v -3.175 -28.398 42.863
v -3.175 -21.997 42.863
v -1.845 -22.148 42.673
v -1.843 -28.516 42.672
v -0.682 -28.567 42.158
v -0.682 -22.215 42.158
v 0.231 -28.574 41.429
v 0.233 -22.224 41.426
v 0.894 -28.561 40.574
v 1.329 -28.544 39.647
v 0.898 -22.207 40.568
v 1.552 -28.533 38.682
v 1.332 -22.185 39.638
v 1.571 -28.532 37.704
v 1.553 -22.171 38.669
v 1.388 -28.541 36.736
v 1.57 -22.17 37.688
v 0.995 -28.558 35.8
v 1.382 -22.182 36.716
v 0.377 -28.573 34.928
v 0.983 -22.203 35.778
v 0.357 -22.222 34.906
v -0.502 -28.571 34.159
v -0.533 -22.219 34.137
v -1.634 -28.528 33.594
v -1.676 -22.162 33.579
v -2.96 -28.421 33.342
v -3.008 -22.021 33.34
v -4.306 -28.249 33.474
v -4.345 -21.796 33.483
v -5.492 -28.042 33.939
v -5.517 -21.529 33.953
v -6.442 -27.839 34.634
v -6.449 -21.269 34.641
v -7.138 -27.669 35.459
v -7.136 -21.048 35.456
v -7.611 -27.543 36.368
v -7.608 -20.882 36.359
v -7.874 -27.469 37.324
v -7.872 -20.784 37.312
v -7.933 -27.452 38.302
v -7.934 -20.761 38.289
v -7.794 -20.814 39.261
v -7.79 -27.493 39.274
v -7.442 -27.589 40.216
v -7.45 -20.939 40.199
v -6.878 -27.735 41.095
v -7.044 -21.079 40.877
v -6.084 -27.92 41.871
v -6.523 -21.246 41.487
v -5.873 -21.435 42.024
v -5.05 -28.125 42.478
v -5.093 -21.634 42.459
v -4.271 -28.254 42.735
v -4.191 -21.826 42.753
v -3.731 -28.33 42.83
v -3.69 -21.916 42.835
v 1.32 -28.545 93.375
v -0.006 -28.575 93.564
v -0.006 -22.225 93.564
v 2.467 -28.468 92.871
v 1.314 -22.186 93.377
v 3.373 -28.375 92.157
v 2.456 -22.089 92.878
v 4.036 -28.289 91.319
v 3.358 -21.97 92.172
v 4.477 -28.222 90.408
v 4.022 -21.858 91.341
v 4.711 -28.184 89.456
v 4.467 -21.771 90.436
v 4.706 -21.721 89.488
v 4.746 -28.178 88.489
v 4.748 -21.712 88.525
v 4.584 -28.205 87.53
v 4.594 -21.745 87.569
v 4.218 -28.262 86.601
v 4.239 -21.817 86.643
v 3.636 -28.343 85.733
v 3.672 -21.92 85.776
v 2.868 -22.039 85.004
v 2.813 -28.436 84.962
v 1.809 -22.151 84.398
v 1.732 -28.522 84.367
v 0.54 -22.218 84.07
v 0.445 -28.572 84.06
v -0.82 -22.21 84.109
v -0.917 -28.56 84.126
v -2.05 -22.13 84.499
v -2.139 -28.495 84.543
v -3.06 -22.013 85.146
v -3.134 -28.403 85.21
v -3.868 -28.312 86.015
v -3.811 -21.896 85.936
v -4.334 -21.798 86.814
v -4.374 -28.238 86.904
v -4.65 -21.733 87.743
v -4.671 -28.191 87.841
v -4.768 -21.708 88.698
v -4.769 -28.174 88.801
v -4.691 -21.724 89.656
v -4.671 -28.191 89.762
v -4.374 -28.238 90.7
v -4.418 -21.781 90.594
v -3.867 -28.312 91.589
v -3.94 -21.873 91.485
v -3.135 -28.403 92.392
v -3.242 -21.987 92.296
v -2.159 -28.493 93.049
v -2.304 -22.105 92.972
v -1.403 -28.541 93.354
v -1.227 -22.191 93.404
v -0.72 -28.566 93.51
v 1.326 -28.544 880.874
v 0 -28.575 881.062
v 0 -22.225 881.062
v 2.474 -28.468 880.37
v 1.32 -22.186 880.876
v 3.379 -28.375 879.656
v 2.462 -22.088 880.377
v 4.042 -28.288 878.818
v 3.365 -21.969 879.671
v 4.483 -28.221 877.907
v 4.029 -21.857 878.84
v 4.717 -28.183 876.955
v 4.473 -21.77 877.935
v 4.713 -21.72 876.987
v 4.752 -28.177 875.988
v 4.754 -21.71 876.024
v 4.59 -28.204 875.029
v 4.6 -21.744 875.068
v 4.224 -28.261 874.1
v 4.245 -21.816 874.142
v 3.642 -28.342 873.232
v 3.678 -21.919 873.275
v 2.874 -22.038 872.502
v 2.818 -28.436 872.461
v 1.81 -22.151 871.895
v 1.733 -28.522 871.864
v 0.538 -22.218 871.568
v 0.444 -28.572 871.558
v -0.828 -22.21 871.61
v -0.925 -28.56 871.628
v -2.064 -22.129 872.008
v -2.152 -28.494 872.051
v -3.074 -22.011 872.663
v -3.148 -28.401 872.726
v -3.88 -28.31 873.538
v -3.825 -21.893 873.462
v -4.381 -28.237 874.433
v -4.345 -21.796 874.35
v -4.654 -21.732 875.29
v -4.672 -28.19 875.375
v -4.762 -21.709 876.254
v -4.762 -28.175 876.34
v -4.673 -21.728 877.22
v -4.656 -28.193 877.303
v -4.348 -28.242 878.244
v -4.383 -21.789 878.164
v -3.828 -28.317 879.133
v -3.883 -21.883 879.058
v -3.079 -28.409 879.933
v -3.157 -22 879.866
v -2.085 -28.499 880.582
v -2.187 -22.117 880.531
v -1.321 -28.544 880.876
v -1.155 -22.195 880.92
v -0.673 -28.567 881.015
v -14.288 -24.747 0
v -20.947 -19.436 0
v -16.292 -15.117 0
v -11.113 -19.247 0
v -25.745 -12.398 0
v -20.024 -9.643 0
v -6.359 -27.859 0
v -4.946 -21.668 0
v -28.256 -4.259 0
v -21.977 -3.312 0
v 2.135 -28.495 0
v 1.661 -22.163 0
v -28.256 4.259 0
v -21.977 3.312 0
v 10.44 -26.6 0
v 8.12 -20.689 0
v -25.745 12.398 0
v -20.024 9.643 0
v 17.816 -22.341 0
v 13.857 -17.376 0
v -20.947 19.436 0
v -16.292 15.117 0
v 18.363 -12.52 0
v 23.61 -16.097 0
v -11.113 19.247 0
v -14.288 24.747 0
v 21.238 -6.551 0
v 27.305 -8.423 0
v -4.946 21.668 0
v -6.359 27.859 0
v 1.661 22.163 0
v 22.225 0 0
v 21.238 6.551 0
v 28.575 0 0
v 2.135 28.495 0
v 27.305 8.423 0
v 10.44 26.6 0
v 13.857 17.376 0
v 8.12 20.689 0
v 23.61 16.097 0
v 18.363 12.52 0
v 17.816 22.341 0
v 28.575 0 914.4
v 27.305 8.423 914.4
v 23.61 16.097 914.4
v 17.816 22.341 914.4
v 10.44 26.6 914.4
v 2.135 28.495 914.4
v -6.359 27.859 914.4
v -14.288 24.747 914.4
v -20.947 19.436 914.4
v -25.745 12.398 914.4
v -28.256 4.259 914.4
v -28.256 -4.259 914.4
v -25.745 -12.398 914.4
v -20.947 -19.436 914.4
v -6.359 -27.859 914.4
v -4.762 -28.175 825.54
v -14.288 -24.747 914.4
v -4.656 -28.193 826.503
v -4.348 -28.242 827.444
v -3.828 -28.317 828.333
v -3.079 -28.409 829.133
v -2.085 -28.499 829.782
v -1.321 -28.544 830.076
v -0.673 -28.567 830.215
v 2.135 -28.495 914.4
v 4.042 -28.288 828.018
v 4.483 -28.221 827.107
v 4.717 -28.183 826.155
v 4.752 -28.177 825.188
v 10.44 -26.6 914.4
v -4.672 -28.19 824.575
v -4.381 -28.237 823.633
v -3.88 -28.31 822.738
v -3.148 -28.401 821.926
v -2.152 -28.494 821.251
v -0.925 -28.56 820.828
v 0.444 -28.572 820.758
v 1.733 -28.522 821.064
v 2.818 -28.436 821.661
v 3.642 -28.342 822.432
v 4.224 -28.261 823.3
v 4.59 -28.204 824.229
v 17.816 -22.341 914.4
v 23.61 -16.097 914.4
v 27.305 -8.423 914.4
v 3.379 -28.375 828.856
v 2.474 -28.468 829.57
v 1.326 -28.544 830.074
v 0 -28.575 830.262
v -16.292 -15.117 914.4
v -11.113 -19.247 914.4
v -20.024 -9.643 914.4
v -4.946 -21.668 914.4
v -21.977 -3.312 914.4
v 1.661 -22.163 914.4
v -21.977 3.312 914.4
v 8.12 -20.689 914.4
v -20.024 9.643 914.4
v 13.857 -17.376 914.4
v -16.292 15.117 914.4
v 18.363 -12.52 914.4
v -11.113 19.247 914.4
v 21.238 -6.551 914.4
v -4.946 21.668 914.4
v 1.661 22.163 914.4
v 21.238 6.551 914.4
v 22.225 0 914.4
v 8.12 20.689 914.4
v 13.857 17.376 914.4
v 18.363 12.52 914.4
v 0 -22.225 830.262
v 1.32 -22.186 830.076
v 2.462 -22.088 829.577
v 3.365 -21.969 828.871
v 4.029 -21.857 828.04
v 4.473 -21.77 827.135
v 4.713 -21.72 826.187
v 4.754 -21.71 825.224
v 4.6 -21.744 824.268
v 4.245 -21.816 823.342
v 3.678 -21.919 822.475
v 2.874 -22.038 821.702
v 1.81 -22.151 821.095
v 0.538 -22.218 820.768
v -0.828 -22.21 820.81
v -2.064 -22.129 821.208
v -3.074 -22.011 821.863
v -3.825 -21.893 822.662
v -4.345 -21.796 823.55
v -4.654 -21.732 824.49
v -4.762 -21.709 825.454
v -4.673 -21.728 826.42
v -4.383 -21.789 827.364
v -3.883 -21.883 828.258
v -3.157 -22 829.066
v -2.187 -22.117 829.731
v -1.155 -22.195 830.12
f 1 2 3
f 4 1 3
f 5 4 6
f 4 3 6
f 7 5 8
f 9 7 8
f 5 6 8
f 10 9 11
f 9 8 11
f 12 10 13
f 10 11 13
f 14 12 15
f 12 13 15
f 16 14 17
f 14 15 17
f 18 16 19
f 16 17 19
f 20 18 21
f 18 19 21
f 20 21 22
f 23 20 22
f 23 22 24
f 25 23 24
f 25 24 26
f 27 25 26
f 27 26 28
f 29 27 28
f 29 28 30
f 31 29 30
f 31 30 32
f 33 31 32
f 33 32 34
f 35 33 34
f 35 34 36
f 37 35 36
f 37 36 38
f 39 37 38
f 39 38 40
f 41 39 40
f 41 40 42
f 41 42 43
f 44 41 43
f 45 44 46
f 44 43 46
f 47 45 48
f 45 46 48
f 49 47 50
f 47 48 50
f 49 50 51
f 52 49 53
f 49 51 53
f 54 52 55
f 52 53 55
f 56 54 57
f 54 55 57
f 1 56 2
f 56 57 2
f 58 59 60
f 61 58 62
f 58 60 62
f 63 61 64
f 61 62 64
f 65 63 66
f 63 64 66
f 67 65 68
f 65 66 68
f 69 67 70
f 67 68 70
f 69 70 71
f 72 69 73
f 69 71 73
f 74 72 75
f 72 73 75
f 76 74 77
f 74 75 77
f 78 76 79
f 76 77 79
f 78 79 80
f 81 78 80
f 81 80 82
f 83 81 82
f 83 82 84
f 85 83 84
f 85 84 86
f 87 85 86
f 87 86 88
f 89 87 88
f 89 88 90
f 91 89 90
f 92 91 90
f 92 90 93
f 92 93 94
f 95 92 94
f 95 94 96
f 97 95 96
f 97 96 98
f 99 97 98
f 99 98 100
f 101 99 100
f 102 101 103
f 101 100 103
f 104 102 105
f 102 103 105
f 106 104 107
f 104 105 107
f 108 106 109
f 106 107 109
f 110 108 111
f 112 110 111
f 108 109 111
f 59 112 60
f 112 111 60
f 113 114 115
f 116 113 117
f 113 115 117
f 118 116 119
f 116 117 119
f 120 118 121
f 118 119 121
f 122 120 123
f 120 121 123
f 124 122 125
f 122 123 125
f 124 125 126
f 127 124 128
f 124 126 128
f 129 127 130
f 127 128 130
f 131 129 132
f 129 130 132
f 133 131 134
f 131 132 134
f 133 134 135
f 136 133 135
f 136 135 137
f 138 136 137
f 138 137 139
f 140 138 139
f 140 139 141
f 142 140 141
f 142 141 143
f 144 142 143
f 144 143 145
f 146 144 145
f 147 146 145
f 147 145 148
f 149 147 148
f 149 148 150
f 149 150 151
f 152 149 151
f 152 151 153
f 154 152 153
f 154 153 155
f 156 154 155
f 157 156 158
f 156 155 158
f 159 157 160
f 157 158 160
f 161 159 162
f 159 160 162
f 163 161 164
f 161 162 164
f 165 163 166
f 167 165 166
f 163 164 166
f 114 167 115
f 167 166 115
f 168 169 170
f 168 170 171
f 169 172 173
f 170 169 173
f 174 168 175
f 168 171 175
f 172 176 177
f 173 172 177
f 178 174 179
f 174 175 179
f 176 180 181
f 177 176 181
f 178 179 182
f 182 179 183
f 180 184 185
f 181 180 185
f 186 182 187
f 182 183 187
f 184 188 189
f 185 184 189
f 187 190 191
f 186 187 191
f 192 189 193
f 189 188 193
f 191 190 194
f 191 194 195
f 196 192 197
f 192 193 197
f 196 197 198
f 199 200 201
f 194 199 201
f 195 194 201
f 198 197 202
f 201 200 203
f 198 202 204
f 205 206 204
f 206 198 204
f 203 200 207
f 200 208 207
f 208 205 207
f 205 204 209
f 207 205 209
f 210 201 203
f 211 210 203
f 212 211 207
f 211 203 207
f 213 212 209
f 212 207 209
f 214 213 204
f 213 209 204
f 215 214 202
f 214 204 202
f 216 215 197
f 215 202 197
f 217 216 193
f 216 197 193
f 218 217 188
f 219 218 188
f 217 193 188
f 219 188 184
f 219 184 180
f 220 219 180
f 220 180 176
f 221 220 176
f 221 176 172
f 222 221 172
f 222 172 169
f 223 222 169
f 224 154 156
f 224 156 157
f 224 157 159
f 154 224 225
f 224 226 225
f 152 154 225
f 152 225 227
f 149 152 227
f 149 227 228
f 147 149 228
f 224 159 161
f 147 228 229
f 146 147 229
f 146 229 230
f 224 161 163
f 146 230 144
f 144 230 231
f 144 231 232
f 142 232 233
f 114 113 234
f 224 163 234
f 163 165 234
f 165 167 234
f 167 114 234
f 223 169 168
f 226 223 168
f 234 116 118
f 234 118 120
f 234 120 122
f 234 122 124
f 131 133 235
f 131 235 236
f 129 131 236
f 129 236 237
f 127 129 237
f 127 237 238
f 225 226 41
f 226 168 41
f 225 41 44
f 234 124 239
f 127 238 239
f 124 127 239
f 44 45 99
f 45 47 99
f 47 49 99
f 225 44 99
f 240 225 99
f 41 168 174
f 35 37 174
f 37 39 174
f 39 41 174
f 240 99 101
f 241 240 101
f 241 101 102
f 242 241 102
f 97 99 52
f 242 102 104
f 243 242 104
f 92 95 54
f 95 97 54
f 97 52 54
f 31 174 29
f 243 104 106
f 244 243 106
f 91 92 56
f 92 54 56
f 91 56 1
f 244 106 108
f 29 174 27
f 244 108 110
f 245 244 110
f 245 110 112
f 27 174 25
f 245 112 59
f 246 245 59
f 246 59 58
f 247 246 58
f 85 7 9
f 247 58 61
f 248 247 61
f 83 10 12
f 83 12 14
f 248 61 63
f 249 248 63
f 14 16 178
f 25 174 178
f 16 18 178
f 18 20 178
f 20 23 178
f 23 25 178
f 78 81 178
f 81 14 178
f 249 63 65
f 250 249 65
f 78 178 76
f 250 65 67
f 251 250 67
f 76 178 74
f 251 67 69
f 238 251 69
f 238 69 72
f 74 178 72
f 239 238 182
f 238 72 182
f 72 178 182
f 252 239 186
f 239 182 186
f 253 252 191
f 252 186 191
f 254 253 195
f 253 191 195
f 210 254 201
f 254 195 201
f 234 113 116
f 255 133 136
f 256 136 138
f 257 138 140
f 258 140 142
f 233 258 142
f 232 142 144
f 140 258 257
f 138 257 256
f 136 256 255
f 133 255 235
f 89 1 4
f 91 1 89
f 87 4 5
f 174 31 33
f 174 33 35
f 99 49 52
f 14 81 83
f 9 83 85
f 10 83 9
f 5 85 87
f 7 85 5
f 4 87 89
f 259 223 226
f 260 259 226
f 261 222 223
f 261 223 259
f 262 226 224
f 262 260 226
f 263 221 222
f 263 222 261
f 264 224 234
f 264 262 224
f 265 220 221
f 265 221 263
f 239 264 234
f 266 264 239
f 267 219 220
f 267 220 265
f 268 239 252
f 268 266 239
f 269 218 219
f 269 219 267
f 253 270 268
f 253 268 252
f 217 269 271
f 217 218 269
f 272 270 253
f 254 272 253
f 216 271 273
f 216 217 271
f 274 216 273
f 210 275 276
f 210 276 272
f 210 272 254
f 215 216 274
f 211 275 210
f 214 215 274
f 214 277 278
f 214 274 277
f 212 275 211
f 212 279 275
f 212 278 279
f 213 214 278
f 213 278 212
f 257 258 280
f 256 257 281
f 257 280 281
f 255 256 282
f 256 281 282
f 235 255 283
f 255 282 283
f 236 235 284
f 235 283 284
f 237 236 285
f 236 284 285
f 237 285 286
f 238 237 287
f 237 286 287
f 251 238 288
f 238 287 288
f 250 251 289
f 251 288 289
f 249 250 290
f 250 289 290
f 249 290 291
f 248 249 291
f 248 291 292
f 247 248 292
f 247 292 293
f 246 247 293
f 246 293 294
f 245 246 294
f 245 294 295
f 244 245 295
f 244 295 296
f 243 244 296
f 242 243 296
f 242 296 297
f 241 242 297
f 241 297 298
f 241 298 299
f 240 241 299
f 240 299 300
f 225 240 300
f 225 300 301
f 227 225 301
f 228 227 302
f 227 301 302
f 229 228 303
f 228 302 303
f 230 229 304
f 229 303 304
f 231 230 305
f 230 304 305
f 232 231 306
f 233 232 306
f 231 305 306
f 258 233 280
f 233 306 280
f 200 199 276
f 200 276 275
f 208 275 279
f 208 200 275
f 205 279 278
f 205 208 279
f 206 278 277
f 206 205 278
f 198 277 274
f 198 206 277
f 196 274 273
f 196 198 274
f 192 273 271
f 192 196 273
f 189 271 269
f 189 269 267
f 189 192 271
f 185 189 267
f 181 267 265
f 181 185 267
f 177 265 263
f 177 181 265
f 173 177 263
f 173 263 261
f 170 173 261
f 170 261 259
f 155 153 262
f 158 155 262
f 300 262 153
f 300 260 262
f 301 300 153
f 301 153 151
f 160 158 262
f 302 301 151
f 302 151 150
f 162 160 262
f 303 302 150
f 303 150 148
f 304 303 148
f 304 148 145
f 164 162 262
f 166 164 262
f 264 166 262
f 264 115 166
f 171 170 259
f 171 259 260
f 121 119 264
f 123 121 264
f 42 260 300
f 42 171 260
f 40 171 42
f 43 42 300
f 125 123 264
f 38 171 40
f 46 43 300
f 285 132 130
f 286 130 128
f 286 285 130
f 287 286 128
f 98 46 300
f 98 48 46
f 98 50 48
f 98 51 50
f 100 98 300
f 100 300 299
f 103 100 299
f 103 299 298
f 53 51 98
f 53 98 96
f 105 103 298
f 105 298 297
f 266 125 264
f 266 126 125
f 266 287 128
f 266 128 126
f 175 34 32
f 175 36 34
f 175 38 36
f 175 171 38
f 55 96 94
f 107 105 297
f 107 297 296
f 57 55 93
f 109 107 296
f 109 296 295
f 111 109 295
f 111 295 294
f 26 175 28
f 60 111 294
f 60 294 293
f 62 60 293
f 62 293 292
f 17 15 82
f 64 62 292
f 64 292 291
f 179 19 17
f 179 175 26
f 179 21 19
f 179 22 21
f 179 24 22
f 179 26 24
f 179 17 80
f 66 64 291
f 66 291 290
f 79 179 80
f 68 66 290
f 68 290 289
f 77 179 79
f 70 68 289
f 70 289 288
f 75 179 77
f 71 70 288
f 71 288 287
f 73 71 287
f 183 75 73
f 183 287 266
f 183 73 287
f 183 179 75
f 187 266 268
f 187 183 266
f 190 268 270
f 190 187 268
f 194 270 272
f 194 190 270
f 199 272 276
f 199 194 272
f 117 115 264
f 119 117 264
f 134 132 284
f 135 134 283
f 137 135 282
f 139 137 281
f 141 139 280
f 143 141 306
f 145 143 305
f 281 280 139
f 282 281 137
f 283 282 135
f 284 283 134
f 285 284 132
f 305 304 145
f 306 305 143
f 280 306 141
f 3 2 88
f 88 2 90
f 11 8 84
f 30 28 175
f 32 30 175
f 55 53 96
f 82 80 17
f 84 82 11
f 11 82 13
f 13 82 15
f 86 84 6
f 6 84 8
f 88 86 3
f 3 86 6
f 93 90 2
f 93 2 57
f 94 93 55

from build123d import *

# Parameters (mm, degrees)
SKETCH1_R           = 28.575
SKETCH1_R_2         = 22.225
BOSS_EXTRUDE1_DEPTH = 914.4
SKETCH2_R           = 4.7625
CUT_EXTRUDE1_DEPTH  = 916.292533155


with BuildPart() as part:
    # Sketch1 → Boss-Extrude1 (new body)
    with BuildSketch(Plane.XY):
        Circle(SKETCH1_R)
        Circle(SKETCH1_R_2, mode=Mode.SUBTRACT)
    extrude(amount=BOSS_EXTRUDE1_DEPTH)

    # Sketch2 → Cut-Extrude1 (cut, through all)
    with BuildSketch(Plane(origin=(0, 0, 0), x_dir=(1, 0, 0), z_dir=(0, 1, 0))):
        with Locations(Location((-3.175, -38.1, 0), (0, 0, 270))):
            Circle(SKETCH2_R)
        with Locations(Location((-0.006183063, -88.801070987, 0), (0, 0, 270))):
            Circle(SKETCH2_R)
        with Locations(Location((0, -876.3, 0), (0, 0, 270))):
            Circle(SKETCH2_R)
        with Locations(Location((0, -825.5, 0), (0, 0, 270))):
            Circle(SKETCH2_R)
    extrude(amount=-CUT_EXTRUDE1_DEPTH, mode=Mode.SUBTRACT)


solid = part.part
